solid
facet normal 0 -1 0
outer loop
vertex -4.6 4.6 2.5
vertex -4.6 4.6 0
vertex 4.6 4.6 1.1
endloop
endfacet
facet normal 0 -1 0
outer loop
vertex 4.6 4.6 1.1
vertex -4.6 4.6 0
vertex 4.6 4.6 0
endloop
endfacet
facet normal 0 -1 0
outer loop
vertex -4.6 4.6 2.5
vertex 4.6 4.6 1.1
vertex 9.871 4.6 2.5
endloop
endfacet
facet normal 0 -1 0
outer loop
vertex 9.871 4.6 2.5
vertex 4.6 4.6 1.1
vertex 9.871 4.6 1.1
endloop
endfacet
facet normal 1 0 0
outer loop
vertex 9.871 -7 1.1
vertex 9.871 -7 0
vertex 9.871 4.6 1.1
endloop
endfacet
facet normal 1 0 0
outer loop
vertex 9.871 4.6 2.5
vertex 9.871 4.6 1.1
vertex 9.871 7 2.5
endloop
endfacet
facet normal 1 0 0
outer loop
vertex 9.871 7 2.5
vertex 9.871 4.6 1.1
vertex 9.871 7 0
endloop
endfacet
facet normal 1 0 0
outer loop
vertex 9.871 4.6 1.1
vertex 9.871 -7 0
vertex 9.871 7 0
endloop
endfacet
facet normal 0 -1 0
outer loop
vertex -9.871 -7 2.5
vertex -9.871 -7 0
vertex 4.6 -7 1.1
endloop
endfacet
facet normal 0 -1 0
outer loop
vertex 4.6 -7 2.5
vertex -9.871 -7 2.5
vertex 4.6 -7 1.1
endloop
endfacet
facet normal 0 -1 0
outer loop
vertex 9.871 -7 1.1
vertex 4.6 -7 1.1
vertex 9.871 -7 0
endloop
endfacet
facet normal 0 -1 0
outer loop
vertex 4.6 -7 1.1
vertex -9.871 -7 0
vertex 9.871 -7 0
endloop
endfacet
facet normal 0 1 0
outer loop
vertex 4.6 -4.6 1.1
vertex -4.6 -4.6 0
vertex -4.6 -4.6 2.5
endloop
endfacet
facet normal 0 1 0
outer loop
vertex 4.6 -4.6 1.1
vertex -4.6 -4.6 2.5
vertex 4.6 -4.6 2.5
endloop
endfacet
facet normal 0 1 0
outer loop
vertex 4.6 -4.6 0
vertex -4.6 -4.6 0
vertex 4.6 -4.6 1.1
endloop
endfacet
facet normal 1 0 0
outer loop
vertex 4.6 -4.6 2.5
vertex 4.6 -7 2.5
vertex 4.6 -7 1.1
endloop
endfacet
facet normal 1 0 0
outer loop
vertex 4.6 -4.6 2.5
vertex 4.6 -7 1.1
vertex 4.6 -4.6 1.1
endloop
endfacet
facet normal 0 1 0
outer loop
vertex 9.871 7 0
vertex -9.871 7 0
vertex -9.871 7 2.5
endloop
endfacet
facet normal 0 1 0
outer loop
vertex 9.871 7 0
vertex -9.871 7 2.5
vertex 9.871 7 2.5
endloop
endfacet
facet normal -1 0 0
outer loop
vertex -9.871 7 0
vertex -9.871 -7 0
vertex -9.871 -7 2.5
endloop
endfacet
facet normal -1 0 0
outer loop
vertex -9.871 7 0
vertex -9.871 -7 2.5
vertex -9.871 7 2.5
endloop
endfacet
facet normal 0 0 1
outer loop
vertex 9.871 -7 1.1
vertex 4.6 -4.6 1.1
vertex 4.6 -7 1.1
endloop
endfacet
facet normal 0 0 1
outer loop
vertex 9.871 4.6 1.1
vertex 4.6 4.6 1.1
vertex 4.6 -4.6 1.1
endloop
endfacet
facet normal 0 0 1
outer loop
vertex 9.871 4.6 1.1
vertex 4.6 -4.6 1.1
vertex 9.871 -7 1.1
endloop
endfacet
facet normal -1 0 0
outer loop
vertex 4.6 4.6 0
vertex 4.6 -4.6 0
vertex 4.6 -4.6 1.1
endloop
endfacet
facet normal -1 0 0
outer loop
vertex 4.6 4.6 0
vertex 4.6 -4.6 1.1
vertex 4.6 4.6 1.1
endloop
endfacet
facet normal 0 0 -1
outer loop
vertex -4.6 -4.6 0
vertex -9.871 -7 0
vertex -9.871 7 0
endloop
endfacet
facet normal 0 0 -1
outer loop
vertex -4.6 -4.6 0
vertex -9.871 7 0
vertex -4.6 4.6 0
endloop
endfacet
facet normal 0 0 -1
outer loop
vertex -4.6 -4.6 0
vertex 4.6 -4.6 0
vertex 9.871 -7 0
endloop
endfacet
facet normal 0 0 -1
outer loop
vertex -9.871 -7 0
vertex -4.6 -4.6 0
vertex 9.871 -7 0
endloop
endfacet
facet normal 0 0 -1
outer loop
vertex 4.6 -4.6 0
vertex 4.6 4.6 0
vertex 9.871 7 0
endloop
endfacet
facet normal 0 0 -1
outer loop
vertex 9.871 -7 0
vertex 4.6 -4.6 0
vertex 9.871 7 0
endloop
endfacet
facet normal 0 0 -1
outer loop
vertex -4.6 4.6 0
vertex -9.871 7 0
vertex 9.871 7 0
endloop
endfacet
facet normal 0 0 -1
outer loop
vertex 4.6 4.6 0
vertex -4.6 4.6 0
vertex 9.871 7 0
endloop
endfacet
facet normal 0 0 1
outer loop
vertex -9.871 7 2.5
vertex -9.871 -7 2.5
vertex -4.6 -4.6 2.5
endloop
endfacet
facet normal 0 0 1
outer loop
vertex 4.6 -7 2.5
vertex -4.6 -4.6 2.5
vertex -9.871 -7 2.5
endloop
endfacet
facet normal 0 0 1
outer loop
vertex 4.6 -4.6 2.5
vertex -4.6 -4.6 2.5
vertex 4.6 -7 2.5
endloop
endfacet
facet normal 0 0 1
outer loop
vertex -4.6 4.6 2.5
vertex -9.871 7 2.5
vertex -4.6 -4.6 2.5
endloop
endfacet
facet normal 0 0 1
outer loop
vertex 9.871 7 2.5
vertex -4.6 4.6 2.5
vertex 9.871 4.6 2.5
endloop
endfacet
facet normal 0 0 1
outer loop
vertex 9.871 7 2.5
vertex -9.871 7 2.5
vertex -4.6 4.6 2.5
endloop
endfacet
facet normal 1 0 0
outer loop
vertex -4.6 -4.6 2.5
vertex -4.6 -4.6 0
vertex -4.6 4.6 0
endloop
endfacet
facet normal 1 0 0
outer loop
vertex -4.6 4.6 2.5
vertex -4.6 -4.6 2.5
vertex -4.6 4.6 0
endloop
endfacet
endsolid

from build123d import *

# Parameters (mm, degrees)
F0_W     = 19.742636
F0_H     = 14
F0_W_2   = 9.2
F0_H_2   = 9.2
F1_DEPTH = 2.5
F2_W     = 10
F2_H     = 20
F3_DEPTH = 1.4


with BuildPart() as f1:
    # F0 (on Top) → F1 (new body)
    with BuildSketch(Plane.XY):
        Rectangle(F0_W, F0_H)
        Rectangle(F0_W_2, F0_H_2, mode=Mode.SUBTRACT)
    extrude(amount=F1_DEPTH)

    # F2 (on face) → F3 (cut)
    with BuildSketch(Plane.XY.offset(2.5)):
        with Locations((9.6, -5.4)):
            Rectangle(F2_W, F2_H)
    extrude(amount=-F3_DEPTH, mode=Mode.SUBTRACT)


solid = f1.part
